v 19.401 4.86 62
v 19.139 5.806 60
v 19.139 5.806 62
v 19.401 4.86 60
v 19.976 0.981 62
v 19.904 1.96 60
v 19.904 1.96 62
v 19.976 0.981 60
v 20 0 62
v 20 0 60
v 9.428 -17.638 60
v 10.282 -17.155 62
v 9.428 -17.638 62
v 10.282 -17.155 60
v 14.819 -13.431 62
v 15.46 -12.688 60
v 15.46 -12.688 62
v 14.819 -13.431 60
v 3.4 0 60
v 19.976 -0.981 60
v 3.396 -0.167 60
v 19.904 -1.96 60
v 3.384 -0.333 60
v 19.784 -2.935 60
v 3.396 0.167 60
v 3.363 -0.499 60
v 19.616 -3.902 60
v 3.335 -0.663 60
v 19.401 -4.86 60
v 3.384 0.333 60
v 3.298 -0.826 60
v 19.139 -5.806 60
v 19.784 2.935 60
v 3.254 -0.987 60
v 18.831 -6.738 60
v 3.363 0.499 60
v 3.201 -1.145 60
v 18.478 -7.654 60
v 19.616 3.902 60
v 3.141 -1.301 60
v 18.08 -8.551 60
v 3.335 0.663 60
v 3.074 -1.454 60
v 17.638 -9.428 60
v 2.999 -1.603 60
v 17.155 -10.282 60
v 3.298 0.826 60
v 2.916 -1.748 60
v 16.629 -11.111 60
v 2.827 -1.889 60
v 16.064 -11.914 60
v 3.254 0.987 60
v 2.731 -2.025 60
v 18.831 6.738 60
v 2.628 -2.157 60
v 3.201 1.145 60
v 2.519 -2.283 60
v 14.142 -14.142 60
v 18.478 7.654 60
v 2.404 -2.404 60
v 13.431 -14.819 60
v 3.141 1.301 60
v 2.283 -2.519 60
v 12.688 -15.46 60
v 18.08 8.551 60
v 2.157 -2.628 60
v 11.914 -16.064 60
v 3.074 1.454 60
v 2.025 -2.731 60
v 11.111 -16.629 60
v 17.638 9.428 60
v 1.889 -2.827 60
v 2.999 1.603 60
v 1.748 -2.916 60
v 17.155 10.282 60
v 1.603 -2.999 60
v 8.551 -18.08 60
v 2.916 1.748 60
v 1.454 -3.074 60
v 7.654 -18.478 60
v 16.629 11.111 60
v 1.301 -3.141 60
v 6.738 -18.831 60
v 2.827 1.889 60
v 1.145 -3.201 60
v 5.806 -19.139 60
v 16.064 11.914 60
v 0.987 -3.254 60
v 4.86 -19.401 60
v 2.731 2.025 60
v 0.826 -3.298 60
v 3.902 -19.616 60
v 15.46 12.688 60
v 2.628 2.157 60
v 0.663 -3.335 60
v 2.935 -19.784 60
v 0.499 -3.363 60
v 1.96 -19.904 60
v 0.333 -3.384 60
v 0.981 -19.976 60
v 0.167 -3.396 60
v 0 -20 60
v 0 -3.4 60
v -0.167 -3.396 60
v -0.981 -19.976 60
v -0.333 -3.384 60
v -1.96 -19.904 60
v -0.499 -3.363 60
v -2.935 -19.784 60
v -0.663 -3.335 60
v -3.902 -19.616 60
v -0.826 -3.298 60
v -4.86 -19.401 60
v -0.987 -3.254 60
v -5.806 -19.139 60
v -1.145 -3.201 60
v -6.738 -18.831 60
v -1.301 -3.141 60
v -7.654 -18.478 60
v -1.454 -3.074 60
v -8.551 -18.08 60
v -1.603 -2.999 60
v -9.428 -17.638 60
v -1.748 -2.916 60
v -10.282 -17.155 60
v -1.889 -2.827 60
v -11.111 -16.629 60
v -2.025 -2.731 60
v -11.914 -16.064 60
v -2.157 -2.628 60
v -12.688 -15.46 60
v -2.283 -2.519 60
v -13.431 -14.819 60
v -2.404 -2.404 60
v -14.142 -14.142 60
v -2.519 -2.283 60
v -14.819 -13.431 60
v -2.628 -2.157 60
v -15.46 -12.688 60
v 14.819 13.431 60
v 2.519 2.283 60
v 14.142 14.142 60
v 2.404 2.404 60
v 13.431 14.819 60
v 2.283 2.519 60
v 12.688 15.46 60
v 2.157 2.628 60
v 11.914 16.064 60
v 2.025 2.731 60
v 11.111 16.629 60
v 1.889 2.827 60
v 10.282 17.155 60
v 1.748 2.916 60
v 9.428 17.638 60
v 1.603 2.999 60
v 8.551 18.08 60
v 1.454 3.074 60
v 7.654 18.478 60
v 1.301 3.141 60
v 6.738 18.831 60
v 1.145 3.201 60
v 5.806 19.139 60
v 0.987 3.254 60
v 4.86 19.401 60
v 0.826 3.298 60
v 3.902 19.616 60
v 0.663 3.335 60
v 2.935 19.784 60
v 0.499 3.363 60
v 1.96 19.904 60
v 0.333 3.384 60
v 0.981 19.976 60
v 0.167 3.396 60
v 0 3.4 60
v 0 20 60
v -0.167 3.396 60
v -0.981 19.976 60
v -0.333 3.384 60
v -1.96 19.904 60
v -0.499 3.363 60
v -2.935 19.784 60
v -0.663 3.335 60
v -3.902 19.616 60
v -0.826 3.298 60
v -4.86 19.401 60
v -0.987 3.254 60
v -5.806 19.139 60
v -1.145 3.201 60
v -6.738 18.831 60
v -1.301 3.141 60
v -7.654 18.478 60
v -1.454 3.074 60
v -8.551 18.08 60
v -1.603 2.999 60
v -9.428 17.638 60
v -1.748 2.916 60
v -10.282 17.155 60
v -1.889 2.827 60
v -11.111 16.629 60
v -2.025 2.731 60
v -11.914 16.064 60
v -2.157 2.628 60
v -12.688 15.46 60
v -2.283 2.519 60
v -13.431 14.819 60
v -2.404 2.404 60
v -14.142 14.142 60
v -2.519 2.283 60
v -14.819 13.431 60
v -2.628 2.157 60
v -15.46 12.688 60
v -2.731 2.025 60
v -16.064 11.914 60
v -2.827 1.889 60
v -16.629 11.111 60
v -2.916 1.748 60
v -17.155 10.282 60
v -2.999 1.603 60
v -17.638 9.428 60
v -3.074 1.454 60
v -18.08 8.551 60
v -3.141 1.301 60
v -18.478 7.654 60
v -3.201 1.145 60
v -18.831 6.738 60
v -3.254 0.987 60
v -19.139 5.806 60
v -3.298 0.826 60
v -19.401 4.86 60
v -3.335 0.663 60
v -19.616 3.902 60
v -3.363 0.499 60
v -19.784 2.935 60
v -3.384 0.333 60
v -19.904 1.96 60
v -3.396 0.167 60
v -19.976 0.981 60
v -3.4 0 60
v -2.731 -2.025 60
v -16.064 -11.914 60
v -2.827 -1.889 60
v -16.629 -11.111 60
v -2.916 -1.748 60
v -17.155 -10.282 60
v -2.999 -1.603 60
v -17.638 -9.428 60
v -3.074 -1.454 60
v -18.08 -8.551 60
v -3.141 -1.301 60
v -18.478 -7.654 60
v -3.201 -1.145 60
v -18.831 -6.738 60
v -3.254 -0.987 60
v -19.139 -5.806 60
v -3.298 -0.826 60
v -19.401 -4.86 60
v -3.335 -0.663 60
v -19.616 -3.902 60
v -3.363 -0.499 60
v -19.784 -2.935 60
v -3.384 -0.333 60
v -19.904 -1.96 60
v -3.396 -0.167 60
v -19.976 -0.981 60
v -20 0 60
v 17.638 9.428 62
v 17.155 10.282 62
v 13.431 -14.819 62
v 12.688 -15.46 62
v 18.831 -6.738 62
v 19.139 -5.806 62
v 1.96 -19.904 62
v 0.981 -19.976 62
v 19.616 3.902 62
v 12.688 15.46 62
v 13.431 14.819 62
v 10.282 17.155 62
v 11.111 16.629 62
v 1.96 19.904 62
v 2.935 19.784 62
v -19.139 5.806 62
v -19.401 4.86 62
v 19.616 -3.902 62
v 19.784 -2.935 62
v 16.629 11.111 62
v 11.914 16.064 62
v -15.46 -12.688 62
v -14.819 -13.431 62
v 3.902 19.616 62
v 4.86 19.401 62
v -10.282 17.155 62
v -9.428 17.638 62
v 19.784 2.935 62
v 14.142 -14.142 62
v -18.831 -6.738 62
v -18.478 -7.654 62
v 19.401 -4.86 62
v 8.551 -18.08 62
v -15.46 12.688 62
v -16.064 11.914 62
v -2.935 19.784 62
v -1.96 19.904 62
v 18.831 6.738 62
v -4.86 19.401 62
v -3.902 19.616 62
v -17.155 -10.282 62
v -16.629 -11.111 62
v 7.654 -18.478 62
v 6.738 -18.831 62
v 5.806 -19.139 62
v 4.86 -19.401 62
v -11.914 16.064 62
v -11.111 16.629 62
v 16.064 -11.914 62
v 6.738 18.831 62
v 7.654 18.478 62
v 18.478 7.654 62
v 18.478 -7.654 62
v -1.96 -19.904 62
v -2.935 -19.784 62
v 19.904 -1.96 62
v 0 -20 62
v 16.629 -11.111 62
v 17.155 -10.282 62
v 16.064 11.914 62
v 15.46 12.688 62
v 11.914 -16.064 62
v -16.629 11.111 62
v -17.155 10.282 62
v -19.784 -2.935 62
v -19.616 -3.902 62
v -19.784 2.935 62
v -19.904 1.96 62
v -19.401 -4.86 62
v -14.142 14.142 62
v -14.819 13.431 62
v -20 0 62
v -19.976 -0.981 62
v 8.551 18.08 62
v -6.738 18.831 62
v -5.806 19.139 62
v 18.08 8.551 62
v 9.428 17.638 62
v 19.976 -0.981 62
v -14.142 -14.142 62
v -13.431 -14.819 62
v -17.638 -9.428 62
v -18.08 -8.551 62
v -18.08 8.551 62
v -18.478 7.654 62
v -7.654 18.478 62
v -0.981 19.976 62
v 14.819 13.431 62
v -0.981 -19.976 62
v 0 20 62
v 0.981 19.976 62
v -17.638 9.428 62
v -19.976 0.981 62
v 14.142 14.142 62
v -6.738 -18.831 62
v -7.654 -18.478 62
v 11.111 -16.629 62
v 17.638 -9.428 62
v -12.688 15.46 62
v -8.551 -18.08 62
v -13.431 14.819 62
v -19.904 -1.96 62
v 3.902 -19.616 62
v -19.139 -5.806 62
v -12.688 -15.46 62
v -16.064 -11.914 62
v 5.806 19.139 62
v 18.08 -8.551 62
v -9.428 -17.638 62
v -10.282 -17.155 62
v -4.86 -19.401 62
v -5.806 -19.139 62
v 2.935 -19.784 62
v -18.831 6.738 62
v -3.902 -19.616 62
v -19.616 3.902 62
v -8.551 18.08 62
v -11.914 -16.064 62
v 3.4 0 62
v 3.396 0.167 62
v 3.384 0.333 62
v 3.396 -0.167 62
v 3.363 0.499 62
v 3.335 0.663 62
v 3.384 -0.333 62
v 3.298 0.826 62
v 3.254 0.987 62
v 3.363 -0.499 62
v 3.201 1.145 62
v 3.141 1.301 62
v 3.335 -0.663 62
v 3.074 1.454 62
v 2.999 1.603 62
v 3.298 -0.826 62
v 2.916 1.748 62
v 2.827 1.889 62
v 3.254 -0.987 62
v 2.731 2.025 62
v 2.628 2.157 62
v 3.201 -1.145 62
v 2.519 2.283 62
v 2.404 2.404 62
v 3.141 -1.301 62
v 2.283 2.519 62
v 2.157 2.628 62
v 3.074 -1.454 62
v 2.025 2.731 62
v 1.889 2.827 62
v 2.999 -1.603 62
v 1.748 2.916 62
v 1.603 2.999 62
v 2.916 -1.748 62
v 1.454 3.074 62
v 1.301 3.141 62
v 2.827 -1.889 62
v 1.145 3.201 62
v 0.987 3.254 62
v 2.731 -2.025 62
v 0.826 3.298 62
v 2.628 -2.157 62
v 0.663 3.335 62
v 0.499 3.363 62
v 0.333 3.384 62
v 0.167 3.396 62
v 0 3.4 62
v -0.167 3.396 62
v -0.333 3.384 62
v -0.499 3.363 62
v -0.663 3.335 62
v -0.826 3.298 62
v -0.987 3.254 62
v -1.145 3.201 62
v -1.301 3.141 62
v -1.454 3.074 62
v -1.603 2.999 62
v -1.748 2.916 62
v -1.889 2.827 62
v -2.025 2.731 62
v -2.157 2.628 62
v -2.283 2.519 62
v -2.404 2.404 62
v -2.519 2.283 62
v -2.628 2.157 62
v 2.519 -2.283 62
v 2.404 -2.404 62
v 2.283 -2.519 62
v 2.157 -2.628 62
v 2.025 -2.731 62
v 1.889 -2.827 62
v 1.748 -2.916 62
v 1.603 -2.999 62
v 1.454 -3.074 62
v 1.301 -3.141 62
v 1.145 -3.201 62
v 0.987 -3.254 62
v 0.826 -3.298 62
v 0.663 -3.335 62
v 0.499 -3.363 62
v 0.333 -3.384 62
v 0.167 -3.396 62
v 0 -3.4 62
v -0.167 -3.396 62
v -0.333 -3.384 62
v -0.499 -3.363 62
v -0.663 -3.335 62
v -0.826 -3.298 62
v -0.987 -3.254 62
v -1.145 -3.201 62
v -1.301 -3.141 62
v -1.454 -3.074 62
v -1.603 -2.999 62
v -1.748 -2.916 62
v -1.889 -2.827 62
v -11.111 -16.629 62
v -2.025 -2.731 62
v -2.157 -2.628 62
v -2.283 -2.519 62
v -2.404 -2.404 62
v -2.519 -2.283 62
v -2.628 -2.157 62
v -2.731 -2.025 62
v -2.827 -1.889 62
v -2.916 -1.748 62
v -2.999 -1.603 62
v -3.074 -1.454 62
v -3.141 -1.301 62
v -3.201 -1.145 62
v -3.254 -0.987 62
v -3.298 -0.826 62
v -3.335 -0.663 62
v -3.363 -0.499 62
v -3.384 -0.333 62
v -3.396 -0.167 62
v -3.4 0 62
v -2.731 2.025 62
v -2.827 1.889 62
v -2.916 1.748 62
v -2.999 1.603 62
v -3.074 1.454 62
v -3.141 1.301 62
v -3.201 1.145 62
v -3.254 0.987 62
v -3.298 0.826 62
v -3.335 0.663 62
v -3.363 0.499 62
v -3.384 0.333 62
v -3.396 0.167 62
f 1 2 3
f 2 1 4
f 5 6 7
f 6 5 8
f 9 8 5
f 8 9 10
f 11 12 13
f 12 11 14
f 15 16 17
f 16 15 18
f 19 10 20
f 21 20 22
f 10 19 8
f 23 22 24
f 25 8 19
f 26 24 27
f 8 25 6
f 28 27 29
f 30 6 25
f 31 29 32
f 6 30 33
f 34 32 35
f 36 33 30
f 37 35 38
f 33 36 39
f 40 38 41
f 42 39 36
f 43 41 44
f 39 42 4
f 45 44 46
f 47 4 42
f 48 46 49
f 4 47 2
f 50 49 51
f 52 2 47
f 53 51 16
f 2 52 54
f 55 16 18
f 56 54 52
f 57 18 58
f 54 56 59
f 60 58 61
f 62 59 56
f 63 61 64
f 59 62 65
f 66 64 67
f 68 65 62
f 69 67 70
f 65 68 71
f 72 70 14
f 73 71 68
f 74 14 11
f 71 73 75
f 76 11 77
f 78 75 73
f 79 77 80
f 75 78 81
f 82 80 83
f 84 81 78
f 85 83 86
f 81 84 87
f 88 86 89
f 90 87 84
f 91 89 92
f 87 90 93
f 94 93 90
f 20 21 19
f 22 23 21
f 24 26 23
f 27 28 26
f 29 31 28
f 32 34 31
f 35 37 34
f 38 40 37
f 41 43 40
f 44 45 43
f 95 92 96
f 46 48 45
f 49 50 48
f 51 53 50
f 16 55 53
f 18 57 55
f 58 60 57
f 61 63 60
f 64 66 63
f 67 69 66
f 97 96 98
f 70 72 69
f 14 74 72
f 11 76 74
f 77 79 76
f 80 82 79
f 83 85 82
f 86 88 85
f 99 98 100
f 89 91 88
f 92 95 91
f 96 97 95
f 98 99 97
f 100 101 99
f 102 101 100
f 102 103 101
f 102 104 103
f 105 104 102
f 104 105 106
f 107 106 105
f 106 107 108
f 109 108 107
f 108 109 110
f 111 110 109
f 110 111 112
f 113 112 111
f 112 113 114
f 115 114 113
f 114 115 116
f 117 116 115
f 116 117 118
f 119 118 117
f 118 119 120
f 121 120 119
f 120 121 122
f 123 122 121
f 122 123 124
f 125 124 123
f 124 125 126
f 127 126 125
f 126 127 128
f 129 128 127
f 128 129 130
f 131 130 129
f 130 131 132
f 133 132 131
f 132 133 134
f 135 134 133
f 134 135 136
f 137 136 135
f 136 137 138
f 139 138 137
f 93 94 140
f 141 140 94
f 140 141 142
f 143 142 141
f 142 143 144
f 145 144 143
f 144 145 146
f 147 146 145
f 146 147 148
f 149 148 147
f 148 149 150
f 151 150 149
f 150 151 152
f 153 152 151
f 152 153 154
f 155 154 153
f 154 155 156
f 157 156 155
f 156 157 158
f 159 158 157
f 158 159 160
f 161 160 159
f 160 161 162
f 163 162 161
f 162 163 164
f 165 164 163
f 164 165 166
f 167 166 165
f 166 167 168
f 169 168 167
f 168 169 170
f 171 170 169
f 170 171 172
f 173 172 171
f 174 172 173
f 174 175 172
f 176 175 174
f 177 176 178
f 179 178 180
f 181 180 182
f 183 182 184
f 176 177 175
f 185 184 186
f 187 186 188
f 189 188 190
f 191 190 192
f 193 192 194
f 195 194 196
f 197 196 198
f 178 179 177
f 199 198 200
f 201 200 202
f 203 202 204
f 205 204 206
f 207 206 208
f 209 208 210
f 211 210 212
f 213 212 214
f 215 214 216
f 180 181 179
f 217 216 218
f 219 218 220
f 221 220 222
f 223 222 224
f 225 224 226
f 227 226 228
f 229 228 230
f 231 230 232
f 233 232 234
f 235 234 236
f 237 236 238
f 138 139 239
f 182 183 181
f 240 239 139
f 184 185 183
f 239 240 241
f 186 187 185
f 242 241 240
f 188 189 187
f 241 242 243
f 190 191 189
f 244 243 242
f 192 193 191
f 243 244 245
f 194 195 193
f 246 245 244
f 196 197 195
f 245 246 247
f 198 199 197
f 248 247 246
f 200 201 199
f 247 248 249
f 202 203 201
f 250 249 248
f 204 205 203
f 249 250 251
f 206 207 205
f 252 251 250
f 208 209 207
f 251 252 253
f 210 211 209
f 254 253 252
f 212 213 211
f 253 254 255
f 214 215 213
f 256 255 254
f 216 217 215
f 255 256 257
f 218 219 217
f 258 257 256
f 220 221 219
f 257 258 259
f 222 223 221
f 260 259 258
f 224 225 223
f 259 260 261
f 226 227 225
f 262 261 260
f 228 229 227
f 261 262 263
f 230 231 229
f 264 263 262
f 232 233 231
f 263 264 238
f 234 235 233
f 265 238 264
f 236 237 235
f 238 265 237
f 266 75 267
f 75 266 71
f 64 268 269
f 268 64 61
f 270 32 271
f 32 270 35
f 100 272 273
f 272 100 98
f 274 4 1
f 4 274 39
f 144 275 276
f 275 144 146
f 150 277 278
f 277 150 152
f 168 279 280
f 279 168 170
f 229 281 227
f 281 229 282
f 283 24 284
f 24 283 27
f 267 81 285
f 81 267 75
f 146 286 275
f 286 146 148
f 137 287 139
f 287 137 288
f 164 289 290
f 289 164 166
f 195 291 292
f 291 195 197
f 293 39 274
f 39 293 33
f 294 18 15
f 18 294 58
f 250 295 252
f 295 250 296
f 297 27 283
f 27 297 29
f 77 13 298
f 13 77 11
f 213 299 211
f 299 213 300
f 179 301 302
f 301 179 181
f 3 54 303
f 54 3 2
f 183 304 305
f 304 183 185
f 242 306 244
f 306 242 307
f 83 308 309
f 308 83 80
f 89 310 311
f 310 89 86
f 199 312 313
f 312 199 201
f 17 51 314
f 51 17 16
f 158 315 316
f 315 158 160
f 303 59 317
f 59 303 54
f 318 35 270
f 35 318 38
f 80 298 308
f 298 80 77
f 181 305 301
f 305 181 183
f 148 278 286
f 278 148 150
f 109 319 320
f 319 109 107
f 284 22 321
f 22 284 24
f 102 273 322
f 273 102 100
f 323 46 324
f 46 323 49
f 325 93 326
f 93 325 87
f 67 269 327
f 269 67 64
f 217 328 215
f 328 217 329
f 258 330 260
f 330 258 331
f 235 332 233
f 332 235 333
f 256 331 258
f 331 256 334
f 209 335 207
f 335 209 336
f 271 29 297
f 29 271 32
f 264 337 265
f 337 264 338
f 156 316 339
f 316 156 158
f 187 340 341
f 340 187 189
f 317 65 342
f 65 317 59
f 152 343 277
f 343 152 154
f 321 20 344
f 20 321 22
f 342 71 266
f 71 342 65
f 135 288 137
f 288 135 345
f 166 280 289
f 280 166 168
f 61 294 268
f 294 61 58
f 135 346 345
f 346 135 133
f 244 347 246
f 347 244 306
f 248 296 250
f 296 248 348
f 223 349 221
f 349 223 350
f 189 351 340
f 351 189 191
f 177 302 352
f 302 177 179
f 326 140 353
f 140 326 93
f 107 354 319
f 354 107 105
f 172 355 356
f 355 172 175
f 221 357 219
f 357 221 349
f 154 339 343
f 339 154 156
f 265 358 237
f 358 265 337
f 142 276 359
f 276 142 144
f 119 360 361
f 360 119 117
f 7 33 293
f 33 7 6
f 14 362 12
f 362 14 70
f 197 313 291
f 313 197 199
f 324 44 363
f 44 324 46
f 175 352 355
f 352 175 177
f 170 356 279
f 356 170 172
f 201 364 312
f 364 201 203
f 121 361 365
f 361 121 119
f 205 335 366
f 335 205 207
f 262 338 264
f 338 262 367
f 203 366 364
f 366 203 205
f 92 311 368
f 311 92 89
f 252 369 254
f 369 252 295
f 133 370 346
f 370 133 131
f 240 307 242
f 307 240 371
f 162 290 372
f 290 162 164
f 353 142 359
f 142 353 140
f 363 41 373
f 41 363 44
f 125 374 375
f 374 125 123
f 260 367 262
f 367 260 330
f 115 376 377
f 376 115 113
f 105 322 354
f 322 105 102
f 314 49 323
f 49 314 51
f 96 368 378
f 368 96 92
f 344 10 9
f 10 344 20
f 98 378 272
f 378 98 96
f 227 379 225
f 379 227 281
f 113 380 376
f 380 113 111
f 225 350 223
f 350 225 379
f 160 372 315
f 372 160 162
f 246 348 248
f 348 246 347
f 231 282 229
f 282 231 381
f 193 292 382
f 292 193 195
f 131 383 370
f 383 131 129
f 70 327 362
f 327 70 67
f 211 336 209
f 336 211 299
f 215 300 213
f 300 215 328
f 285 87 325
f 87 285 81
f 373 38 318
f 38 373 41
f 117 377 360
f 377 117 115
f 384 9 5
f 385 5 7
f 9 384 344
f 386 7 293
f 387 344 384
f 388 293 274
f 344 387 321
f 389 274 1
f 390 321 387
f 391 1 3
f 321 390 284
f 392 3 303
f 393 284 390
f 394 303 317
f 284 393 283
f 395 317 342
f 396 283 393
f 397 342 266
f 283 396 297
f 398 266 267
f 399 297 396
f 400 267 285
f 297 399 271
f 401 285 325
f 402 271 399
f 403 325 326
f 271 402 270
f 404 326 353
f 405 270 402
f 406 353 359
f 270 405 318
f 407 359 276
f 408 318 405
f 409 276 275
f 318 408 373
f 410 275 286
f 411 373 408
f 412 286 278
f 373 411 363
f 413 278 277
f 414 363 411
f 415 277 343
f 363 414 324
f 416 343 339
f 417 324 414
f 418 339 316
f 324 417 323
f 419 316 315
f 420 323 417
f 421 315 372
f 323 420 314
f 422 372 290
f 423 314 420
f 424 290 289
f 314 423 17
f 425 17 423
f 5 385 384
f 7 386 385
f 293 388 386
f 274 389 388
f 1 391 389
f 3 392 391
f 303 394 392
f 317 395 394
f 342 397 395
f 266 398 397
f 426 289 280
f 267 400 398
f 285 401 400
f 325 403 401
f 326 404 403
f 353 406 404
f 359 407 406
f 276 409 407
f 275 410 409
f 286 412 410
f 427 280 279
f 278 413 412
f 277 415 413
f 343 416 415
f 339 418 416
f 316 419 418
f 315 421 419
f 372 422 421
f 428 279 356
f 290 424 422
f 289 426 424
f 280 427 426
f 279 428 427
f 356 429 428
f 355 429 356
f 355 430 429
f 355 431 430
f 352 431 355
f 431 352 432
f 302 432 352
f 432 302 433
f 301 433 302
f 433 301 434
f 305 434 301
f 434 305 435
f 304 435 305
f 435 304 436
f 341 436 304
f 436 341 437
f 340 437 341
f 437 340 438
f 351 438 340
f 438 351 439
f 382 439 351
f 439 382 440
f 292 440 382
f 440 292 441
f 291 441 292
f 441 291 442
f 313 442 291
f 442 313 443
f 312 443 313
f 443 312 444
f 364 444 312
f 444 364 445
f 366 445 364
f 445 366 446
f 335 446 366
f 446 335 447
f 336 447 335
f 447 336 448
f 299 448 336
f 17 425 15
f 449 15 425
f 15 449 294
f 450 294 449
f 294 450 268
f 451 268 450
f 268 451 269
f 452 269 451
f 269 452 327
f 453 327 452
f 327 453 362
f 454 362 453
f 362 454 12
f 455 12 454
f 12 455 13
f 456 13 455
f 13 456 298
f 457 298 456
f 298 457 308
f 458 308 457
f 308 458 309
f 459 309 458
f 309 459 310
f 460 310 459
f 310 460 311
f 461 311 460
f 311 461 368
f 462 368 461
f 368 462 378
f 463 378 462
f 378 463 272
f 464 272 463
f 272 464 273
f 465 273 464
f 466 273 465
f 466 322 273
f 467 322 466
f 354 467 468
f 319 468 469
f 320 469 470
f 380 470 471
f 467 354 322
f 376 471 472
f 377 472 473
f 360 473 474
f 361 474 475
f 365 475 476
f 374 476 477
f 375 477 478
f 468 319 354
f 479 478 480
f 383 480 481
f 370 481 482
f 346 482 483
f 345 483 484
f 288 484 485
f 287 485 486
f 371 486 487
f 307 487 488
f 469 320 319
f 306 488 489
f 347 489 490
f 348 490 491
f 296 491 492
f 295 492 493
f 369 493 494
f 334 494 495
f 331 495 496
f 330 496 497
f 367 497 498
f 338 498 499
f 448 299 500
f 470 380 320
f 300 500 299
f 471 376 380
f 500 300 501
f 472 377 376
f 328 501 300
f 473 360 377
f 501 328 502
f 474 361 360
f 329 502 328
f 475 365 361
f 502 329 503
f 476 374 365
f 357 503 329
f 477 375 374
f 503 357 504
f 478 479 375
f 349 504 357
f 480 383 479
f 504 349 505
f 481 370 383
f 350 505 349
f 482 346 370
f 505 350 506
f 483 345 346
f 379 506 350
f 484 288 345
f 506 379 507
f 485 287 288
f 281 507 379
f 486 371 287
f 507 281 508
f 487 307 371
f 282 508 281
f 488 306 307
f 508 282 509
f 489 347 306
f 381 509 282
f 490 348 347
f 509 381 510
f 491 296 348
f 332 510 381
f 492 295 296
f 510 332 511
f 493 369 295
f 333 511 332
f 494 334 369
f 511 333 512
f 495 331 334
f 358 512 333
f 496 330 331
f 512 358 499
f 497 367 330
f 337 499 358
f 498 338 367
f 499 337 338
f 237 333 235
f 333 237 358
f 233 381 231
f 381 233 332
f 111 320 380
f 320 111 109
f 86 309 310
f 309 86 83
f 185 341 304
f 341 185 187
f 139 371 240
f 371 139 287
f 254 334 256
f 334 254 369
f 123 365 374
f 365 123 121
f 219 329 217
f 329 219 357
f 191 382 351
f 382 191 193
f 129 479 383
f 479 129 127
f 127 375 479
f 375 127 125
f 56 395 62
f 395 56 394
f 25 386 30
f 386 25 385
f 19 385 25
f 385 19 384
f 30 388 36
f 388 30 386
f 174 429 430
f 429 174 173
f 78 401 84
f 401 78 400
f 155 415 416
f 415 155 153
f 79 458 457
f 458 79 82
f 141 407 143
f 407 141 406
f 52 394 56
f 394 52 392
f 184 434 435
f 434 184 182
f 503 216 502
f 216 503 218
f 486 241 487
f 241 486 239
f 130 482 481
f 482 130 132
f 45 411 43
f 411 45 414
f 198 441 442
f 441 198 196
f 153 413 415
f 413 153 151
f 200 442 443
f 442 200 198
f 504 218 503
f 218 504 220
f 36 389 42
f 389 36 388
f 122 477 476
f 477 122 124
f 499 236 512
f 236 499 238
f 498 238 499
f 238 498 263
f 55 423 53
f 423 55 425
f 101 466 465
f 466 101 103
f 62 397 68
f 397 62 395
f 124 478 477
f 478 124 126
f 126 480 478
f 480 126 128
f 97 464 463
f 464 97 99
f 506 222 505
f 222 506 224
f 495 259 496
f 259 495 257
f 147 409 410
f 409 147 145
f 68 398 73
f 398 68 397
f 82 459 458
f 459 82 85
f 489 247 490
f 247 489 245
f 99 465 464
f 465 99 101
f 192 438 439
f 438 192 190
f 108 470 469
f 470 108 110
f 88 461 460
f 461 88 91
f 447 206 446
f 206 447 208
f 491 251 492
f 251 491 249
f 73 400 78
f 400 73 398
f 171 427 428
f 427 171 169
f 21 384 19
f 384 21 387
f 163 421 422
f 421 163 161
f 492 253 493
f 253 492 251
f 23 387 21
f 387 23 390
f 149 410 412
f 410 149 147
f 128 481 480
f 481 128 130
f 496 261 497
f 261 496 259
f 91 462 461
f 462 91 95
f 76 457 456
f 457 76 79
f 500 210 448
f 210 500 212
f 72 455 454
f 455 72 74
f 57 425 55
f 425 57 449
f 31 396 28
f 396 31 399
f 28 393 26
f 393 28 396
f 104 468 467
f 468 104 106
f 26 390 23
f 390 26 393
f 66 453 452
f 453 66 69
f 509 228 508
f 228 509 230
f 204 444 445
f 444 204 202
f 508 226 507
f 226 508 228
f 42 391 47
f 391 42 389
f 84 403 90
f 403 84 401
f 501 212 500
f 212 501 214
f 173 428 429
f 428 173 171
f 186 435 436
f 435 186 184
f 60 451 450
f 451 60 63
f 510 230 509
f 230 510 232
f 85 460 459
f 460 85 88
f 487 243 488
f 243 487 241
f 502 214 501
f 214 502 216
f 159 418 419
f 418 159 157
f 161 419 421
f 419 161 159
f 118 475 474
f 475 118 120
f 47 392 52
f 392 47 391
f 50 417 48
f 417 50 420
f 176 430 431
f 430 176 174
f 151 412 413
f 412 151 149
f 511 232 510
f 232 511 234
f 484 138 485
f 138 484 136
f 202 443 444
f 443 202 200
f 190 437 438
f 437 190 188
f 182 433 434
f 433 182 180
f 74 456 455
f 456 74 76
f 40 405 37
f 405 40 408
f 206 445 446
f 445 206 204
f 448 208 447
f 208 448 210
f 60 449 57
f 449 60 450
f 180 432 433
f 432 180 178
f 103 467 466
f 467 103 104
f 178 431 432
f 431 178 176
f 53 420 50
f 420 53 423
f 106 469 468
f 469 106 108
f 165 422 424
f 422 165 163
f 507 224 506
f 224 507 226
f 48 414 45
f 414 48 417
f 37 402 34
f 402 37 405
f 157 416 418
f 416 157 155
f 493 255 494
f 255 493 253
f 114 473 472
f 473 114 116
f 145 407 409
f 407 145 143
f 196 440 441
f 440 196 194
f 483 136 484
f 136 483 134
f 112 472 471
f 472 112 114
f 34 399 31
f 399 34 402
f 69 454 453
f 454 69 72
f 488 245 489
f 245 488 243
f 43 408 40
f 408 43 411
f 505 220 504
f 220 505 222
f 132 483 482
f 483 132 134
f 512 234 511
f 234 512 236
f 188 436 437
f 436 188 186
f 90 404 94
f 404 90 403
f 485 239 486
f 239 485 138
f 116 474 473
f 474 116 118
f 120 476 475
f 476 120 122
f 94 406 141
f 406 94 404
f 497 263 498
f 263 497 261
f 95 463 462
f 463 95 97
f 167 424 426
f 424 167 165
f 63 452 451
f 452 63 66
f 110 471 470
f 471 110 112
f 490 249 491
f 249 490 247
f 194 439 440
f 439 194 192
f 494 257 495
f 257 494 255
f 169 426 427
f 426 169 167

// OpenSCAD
// file: common_params.scad
cylinder_radius = 20.000000;
cylinder_height = 60.000000;
wall_thickness = 2.000000;

cap_thickness = 2.000000;

rod_radius = 2.000000;
rod_height = 50.000000;

ring_outer_radius = 8.000000;
ring_inner_radius = 4.000000;
ring_thickness = 3.000000;
ring_z = 40.000000;

$fn = 128;
// main file
include <common_params.scad>;

hole_radius = 3.400000;

translate([0, 0, cylinder_height])
difference() {
    cylinder(h = cap_thickness, r = cylinder_radius);
    translate([0, 0, -0.1])
        cylinder(h = cap_thickness + 0.2, r = hole_radius);
}
